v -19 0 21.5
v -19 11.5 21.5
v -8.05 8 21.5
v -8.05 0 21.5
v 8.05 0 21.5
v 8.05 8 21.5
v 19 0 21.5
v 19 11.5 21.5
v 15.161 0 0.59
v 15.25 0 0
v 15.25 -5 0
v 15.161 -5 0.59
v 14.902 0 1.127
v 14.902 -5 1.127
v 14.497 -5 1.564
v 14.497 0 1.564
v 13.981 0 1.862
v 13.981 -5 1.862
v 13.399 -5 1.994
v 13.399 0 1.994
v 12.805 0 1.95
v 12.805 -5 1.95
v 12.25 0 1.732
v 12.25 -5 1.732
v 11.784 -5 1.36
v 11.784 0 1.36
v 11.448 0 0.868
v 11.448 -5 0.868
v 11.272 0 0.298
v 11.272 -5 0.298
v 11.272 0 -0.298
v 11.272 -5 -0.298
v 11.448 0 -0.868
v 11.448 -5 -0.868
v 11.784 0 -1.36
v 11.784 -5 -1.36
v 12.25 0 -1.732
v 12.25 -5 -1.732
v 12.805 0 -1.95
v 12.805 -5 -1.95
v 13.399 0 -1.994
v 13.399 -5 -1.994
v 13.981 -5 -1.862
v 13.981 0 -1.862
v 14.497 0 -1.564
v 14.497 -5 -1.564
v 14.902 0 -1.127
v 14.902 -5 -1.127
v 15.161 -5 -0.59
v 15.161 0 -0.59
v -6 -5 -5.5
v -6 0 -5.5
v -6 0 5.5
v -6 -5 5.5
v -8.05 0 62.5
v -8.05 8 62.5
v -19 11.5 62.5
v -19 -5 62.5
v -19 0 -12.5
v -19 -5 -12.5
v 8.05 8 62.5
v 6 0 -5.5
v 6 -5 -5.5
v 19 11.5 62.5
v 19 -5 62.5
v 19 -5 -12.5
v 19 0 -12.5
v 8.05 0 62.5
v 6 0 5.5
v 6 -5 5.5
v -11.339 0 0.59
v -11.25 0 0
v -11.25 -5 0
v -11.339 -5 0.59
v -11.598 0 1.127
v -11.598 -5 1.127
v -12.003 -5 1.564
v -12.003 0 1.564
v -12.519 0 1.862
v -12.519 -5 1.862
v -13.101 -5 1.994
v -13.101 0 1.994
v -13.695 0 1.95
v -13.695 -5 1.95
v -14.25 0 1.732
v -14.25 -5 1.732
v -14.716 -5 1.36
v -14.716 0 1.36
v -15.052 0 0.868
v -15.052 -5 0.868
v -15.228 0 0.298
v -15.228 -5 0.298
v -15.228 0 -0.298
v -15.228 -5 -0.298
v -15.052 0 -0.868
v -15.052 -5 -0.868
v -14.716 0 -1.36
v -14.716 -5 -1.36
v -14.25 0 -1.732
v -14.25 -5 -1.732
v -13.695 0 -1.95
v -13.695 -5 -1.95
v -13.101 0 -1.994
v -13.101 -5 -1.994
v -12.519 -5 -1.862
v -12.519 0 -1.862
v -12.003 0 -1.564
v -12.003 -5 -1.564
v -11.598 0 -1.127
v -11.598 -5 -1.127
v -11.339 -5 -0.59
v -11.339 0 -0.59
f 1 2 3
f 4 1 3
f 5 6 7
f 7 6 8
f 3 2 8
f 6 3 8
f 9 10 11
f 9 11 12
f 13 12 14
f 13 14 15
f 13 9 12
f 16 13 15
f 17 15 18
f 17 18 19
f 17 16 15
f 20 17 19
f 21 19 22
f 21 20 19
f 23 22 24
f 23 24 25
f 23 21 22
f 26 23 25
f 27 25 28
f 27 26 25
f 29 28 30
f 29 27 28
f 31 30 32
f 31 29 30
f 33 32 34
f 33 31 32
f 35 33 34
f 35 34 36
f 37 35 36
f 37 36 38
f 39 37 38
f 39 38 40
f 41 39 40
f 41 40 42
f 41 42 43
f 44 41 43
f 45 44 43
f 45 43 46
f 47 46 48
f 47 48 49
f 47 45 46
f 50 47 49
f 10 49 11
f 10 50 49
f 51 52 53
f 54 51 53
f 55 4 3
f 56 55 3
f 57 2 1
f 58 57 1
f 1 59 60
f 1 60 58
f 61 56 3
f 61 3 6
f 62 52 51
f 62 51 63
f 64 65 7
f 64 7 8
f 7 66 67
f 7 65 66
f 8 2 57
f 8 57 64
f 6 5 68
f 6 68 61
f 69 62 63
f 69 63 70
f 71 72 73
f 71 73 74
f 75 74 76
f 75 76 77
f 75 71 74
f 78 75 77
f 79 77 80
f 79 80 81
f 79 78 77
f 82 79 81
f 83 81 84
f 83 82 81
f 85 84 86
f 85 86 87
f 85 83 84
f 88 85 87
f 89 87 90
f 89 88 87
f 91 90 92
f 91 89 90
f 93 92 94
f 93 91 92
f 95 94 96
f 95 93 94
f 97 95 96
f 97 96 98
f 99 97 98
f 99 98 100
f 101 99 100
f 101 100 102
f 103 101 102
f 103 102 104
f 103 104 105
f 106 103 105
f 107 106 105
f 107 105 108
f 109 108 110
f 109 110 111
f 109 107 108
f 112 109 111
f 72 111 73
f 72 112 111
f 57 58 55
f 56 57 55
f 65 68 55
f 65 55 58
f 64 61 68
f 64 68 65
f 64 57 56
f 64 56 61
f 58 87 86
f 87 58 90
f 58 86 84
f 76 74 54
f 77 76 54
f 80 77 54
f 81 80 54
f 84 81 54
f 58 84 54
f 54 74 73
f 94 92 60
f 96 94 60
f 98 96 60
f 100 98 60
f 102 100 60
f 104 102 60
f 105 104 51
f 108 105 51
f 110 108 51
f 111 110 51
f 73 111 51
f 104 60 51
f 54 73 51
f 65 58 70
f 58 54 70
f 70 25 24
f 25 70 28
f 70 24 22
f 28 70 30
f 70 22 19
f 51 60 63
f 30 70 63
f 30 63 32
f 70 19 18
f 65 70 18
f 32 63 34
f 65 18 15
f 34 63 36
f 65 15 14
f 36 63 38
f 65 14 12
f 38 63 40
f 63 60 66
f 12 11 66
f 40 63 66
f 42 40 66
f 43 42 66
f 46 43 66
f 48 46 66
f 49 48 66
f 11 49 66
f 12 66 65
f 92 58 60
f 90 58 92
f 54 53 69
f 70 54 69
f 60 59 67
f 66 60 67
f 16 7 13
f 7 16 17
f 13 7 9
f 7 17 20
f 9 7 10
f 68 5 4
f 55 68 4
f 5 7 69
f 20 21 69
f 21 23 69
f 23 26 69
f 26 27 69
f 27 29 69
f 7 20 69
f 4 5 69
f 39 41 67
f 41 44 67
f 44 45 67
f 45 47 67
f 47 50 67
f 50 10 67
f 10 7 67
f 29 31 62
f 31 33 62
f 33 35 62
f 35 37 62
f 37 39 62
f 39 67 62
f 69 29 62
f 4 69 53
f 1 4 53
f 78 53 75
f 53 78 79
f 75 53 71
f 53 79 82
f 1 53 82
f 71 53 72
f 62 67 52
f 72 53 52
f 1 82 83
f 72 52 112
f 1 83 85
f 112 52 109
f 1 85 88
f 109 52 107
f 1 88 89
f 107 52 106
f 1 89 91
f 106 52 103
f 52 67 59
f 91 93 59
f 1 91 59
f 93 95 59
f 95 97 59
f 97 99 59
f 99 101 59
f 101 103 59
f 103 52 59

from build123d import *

# Parameters (mm, degrees)
F0_R     = 2
F2_DEPTH = 5
F1_W     = 12
F1_H     = 11
F3_DEPTH = 50.9
F4_W     = 38
F4_H     = 15
F4_H_2   = 5
F5_DEPTH = 50
F6_DEPTH = 9
F7_W     = 16.1
F7_H     = 8
F8_DEPTH = 59.7
F9_DEPTH = 3.5


with BuildPart() as f2:
    # F0 (on Front) → F2 (new body)
    with BuildSketch(Plane.XZ):
        with BuildLine():
            ThreePointArc((-2.5, 0), (0, 2.5), (2.5, 0))
            Line((2.5, 0), (8, 0))
            Line((8, 0), (8, -3.5))
            Line((8, -3.5), (19, -3.5))
            Line((19, -3.5), (19, 12.5))
            Line((19, 12.5), (-19, 12.5))
            Line((-19, 12.5), (-19, 3.5))
            Line((-19, 3.5), (-8, 3.5))
            Line((-8, 3.5), (-8, 0))
            Line((-8, 0), (-2.5, 0))
        make_face()
        with Locations((13.25, 0)):
            Circle(F0_R, mode=Mode.SUBTRACT)
        with BuildLine():
            Line((8, 0), (2.5, 0))
            ThreePointArc((2.5, 0), (0, -2.5), (-2.5, 0))
            Line((-2.5, 0), (-8, 0))
            Line((-8, 0), (-8, 3.5))
            Line((-8, 3.5), (-19, 3.5))
            Line((-19, 3.5), (-19, -12.5))
            Line((-19, -12.5), (19, -12.5))
            Line((19, -12.5), (19, -3.5))
            Line((19, -3.5), (8, -3.5))
            Line((8, -3.5), (8, 0))
        make_face()
        with Locations((-13.25, 0)):
            Circle(F0_R, mode=Mode.SUBTRACT)
    extrude(amount=F2_DEPTH)

    # F1 (on Front) → F3 (cut)
    with BuildSketch(Plane.XZ):
        Rectangle(F1_W, F1_H)
    extrude(amount=F3_DEPTH, mode=Mode.SUBTRACT)

    # F4 (on face) → F5 (join)
    with BuildSketch(Plane.XY.offset(12.5)):
        with Locations((0, 7.5)):
            Rectangle(F4_W, F4_H)
        with Locations((0, -2.5)):
            Rectangle(F4_W, F4_H_2)
    extrude(amount=F5_DEPTH)

    # F6 (cut): a face of the model
    f6_faces = [f2.faces().sort_by_distance(p)[0] for p in [
        (0, 7.5, 12.5),
    ]]
    extrude(f6_faces, amount=-F6_DEPTH, mode=Mode.SUBTRACT)

    # F7 (on face) → F8 (cut)
    with BuildSketch(Plane.XY.offset(62.5)):
        with Locations((0, 4)):
            Rectangle(F7_W, F7_H)
    extrude(amount=-F8_DEPTH, mode=Mode.SUBTRACT)

    # F9 (cut): a face of the model
    f9_faces = [f2.faces().sort_by_distance(p)[0] for p in [
        (0, 15, 42),
    ]]
    extrude(f9_faces, amount=-F9_DEPTH, mode=Mode.SUBTRACT)


solid = f2.part
